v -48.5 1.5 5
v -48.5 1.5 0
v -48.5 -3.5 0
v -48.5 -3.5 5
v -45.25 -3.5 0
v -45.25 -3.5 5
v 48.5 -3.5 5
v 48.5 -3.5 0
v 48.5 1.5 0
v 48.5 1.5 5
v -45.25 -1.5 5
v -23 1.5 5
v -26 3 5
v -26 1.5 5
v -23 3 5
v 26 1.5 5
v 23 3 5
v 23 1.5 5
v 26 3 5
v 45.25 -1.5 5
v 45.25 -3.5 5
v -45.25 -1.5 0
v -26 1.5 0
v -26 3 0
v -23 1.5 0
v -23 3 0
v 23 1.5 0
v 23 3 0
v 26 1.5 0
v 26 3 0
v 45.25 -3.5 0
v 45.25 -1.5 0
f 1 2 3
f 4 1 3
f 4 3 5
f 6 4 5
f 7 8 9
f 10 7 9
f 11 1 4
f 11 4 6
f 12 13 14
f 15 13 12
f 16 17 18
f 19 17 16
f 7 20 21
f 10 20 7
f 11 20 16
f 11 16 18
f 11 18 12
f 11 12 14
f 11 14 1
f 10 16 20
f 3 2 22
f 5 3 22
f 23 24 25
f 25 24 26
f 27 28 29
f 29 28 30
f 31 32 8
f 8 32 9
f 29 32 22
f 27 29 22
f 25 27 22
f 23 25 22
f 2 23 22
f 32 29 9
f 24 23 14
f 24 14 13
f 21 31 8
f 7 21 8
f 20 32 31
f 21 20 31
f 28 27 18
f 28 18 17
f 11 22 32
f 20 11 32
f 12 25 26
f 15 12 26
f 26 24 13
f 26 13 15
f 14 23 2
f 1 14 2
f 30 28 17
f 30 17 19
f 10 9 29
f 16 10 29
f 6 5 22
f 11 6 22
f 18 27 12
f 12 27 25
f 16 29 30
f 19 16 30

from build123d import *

# Parameters (mm, degrees)
F0_W     = 3
F0_H     = 1.5
F1_DEPTH = 5


with BuildPart() as f1:
    # F0 (on Top) → F1 (new body)
    with BuildSketch(Plane.XY):
        Polygon((-45.25, -3.5), (-45.25, -1.5), (-45.25, 1.5), (-48.5, 1.5), (-48.5, -3.5), align=None)
        with Locations((-24.5, 2.25)):
            Rectangle(F0_W, F0_H)
        Polygon((-45.25, -1.5), (45.25, -1.5), (45.25, 1.5), (26, 1.5), (23, 1.5), (-23, 1.5), (-26, 1.5), (-45.25, 1.5), align=None)
        with Locations((24.5, 2.25)):
            Rectangle(F0_W, F0_H)
        Polygon((45.25, 1.5), (45.25, -1.5), (45.25, -3.5), (48.5, -3.5), (48.5, 1.5), align=None)
    extrude(amount=F1_DEPTH)


solid = f1.part
